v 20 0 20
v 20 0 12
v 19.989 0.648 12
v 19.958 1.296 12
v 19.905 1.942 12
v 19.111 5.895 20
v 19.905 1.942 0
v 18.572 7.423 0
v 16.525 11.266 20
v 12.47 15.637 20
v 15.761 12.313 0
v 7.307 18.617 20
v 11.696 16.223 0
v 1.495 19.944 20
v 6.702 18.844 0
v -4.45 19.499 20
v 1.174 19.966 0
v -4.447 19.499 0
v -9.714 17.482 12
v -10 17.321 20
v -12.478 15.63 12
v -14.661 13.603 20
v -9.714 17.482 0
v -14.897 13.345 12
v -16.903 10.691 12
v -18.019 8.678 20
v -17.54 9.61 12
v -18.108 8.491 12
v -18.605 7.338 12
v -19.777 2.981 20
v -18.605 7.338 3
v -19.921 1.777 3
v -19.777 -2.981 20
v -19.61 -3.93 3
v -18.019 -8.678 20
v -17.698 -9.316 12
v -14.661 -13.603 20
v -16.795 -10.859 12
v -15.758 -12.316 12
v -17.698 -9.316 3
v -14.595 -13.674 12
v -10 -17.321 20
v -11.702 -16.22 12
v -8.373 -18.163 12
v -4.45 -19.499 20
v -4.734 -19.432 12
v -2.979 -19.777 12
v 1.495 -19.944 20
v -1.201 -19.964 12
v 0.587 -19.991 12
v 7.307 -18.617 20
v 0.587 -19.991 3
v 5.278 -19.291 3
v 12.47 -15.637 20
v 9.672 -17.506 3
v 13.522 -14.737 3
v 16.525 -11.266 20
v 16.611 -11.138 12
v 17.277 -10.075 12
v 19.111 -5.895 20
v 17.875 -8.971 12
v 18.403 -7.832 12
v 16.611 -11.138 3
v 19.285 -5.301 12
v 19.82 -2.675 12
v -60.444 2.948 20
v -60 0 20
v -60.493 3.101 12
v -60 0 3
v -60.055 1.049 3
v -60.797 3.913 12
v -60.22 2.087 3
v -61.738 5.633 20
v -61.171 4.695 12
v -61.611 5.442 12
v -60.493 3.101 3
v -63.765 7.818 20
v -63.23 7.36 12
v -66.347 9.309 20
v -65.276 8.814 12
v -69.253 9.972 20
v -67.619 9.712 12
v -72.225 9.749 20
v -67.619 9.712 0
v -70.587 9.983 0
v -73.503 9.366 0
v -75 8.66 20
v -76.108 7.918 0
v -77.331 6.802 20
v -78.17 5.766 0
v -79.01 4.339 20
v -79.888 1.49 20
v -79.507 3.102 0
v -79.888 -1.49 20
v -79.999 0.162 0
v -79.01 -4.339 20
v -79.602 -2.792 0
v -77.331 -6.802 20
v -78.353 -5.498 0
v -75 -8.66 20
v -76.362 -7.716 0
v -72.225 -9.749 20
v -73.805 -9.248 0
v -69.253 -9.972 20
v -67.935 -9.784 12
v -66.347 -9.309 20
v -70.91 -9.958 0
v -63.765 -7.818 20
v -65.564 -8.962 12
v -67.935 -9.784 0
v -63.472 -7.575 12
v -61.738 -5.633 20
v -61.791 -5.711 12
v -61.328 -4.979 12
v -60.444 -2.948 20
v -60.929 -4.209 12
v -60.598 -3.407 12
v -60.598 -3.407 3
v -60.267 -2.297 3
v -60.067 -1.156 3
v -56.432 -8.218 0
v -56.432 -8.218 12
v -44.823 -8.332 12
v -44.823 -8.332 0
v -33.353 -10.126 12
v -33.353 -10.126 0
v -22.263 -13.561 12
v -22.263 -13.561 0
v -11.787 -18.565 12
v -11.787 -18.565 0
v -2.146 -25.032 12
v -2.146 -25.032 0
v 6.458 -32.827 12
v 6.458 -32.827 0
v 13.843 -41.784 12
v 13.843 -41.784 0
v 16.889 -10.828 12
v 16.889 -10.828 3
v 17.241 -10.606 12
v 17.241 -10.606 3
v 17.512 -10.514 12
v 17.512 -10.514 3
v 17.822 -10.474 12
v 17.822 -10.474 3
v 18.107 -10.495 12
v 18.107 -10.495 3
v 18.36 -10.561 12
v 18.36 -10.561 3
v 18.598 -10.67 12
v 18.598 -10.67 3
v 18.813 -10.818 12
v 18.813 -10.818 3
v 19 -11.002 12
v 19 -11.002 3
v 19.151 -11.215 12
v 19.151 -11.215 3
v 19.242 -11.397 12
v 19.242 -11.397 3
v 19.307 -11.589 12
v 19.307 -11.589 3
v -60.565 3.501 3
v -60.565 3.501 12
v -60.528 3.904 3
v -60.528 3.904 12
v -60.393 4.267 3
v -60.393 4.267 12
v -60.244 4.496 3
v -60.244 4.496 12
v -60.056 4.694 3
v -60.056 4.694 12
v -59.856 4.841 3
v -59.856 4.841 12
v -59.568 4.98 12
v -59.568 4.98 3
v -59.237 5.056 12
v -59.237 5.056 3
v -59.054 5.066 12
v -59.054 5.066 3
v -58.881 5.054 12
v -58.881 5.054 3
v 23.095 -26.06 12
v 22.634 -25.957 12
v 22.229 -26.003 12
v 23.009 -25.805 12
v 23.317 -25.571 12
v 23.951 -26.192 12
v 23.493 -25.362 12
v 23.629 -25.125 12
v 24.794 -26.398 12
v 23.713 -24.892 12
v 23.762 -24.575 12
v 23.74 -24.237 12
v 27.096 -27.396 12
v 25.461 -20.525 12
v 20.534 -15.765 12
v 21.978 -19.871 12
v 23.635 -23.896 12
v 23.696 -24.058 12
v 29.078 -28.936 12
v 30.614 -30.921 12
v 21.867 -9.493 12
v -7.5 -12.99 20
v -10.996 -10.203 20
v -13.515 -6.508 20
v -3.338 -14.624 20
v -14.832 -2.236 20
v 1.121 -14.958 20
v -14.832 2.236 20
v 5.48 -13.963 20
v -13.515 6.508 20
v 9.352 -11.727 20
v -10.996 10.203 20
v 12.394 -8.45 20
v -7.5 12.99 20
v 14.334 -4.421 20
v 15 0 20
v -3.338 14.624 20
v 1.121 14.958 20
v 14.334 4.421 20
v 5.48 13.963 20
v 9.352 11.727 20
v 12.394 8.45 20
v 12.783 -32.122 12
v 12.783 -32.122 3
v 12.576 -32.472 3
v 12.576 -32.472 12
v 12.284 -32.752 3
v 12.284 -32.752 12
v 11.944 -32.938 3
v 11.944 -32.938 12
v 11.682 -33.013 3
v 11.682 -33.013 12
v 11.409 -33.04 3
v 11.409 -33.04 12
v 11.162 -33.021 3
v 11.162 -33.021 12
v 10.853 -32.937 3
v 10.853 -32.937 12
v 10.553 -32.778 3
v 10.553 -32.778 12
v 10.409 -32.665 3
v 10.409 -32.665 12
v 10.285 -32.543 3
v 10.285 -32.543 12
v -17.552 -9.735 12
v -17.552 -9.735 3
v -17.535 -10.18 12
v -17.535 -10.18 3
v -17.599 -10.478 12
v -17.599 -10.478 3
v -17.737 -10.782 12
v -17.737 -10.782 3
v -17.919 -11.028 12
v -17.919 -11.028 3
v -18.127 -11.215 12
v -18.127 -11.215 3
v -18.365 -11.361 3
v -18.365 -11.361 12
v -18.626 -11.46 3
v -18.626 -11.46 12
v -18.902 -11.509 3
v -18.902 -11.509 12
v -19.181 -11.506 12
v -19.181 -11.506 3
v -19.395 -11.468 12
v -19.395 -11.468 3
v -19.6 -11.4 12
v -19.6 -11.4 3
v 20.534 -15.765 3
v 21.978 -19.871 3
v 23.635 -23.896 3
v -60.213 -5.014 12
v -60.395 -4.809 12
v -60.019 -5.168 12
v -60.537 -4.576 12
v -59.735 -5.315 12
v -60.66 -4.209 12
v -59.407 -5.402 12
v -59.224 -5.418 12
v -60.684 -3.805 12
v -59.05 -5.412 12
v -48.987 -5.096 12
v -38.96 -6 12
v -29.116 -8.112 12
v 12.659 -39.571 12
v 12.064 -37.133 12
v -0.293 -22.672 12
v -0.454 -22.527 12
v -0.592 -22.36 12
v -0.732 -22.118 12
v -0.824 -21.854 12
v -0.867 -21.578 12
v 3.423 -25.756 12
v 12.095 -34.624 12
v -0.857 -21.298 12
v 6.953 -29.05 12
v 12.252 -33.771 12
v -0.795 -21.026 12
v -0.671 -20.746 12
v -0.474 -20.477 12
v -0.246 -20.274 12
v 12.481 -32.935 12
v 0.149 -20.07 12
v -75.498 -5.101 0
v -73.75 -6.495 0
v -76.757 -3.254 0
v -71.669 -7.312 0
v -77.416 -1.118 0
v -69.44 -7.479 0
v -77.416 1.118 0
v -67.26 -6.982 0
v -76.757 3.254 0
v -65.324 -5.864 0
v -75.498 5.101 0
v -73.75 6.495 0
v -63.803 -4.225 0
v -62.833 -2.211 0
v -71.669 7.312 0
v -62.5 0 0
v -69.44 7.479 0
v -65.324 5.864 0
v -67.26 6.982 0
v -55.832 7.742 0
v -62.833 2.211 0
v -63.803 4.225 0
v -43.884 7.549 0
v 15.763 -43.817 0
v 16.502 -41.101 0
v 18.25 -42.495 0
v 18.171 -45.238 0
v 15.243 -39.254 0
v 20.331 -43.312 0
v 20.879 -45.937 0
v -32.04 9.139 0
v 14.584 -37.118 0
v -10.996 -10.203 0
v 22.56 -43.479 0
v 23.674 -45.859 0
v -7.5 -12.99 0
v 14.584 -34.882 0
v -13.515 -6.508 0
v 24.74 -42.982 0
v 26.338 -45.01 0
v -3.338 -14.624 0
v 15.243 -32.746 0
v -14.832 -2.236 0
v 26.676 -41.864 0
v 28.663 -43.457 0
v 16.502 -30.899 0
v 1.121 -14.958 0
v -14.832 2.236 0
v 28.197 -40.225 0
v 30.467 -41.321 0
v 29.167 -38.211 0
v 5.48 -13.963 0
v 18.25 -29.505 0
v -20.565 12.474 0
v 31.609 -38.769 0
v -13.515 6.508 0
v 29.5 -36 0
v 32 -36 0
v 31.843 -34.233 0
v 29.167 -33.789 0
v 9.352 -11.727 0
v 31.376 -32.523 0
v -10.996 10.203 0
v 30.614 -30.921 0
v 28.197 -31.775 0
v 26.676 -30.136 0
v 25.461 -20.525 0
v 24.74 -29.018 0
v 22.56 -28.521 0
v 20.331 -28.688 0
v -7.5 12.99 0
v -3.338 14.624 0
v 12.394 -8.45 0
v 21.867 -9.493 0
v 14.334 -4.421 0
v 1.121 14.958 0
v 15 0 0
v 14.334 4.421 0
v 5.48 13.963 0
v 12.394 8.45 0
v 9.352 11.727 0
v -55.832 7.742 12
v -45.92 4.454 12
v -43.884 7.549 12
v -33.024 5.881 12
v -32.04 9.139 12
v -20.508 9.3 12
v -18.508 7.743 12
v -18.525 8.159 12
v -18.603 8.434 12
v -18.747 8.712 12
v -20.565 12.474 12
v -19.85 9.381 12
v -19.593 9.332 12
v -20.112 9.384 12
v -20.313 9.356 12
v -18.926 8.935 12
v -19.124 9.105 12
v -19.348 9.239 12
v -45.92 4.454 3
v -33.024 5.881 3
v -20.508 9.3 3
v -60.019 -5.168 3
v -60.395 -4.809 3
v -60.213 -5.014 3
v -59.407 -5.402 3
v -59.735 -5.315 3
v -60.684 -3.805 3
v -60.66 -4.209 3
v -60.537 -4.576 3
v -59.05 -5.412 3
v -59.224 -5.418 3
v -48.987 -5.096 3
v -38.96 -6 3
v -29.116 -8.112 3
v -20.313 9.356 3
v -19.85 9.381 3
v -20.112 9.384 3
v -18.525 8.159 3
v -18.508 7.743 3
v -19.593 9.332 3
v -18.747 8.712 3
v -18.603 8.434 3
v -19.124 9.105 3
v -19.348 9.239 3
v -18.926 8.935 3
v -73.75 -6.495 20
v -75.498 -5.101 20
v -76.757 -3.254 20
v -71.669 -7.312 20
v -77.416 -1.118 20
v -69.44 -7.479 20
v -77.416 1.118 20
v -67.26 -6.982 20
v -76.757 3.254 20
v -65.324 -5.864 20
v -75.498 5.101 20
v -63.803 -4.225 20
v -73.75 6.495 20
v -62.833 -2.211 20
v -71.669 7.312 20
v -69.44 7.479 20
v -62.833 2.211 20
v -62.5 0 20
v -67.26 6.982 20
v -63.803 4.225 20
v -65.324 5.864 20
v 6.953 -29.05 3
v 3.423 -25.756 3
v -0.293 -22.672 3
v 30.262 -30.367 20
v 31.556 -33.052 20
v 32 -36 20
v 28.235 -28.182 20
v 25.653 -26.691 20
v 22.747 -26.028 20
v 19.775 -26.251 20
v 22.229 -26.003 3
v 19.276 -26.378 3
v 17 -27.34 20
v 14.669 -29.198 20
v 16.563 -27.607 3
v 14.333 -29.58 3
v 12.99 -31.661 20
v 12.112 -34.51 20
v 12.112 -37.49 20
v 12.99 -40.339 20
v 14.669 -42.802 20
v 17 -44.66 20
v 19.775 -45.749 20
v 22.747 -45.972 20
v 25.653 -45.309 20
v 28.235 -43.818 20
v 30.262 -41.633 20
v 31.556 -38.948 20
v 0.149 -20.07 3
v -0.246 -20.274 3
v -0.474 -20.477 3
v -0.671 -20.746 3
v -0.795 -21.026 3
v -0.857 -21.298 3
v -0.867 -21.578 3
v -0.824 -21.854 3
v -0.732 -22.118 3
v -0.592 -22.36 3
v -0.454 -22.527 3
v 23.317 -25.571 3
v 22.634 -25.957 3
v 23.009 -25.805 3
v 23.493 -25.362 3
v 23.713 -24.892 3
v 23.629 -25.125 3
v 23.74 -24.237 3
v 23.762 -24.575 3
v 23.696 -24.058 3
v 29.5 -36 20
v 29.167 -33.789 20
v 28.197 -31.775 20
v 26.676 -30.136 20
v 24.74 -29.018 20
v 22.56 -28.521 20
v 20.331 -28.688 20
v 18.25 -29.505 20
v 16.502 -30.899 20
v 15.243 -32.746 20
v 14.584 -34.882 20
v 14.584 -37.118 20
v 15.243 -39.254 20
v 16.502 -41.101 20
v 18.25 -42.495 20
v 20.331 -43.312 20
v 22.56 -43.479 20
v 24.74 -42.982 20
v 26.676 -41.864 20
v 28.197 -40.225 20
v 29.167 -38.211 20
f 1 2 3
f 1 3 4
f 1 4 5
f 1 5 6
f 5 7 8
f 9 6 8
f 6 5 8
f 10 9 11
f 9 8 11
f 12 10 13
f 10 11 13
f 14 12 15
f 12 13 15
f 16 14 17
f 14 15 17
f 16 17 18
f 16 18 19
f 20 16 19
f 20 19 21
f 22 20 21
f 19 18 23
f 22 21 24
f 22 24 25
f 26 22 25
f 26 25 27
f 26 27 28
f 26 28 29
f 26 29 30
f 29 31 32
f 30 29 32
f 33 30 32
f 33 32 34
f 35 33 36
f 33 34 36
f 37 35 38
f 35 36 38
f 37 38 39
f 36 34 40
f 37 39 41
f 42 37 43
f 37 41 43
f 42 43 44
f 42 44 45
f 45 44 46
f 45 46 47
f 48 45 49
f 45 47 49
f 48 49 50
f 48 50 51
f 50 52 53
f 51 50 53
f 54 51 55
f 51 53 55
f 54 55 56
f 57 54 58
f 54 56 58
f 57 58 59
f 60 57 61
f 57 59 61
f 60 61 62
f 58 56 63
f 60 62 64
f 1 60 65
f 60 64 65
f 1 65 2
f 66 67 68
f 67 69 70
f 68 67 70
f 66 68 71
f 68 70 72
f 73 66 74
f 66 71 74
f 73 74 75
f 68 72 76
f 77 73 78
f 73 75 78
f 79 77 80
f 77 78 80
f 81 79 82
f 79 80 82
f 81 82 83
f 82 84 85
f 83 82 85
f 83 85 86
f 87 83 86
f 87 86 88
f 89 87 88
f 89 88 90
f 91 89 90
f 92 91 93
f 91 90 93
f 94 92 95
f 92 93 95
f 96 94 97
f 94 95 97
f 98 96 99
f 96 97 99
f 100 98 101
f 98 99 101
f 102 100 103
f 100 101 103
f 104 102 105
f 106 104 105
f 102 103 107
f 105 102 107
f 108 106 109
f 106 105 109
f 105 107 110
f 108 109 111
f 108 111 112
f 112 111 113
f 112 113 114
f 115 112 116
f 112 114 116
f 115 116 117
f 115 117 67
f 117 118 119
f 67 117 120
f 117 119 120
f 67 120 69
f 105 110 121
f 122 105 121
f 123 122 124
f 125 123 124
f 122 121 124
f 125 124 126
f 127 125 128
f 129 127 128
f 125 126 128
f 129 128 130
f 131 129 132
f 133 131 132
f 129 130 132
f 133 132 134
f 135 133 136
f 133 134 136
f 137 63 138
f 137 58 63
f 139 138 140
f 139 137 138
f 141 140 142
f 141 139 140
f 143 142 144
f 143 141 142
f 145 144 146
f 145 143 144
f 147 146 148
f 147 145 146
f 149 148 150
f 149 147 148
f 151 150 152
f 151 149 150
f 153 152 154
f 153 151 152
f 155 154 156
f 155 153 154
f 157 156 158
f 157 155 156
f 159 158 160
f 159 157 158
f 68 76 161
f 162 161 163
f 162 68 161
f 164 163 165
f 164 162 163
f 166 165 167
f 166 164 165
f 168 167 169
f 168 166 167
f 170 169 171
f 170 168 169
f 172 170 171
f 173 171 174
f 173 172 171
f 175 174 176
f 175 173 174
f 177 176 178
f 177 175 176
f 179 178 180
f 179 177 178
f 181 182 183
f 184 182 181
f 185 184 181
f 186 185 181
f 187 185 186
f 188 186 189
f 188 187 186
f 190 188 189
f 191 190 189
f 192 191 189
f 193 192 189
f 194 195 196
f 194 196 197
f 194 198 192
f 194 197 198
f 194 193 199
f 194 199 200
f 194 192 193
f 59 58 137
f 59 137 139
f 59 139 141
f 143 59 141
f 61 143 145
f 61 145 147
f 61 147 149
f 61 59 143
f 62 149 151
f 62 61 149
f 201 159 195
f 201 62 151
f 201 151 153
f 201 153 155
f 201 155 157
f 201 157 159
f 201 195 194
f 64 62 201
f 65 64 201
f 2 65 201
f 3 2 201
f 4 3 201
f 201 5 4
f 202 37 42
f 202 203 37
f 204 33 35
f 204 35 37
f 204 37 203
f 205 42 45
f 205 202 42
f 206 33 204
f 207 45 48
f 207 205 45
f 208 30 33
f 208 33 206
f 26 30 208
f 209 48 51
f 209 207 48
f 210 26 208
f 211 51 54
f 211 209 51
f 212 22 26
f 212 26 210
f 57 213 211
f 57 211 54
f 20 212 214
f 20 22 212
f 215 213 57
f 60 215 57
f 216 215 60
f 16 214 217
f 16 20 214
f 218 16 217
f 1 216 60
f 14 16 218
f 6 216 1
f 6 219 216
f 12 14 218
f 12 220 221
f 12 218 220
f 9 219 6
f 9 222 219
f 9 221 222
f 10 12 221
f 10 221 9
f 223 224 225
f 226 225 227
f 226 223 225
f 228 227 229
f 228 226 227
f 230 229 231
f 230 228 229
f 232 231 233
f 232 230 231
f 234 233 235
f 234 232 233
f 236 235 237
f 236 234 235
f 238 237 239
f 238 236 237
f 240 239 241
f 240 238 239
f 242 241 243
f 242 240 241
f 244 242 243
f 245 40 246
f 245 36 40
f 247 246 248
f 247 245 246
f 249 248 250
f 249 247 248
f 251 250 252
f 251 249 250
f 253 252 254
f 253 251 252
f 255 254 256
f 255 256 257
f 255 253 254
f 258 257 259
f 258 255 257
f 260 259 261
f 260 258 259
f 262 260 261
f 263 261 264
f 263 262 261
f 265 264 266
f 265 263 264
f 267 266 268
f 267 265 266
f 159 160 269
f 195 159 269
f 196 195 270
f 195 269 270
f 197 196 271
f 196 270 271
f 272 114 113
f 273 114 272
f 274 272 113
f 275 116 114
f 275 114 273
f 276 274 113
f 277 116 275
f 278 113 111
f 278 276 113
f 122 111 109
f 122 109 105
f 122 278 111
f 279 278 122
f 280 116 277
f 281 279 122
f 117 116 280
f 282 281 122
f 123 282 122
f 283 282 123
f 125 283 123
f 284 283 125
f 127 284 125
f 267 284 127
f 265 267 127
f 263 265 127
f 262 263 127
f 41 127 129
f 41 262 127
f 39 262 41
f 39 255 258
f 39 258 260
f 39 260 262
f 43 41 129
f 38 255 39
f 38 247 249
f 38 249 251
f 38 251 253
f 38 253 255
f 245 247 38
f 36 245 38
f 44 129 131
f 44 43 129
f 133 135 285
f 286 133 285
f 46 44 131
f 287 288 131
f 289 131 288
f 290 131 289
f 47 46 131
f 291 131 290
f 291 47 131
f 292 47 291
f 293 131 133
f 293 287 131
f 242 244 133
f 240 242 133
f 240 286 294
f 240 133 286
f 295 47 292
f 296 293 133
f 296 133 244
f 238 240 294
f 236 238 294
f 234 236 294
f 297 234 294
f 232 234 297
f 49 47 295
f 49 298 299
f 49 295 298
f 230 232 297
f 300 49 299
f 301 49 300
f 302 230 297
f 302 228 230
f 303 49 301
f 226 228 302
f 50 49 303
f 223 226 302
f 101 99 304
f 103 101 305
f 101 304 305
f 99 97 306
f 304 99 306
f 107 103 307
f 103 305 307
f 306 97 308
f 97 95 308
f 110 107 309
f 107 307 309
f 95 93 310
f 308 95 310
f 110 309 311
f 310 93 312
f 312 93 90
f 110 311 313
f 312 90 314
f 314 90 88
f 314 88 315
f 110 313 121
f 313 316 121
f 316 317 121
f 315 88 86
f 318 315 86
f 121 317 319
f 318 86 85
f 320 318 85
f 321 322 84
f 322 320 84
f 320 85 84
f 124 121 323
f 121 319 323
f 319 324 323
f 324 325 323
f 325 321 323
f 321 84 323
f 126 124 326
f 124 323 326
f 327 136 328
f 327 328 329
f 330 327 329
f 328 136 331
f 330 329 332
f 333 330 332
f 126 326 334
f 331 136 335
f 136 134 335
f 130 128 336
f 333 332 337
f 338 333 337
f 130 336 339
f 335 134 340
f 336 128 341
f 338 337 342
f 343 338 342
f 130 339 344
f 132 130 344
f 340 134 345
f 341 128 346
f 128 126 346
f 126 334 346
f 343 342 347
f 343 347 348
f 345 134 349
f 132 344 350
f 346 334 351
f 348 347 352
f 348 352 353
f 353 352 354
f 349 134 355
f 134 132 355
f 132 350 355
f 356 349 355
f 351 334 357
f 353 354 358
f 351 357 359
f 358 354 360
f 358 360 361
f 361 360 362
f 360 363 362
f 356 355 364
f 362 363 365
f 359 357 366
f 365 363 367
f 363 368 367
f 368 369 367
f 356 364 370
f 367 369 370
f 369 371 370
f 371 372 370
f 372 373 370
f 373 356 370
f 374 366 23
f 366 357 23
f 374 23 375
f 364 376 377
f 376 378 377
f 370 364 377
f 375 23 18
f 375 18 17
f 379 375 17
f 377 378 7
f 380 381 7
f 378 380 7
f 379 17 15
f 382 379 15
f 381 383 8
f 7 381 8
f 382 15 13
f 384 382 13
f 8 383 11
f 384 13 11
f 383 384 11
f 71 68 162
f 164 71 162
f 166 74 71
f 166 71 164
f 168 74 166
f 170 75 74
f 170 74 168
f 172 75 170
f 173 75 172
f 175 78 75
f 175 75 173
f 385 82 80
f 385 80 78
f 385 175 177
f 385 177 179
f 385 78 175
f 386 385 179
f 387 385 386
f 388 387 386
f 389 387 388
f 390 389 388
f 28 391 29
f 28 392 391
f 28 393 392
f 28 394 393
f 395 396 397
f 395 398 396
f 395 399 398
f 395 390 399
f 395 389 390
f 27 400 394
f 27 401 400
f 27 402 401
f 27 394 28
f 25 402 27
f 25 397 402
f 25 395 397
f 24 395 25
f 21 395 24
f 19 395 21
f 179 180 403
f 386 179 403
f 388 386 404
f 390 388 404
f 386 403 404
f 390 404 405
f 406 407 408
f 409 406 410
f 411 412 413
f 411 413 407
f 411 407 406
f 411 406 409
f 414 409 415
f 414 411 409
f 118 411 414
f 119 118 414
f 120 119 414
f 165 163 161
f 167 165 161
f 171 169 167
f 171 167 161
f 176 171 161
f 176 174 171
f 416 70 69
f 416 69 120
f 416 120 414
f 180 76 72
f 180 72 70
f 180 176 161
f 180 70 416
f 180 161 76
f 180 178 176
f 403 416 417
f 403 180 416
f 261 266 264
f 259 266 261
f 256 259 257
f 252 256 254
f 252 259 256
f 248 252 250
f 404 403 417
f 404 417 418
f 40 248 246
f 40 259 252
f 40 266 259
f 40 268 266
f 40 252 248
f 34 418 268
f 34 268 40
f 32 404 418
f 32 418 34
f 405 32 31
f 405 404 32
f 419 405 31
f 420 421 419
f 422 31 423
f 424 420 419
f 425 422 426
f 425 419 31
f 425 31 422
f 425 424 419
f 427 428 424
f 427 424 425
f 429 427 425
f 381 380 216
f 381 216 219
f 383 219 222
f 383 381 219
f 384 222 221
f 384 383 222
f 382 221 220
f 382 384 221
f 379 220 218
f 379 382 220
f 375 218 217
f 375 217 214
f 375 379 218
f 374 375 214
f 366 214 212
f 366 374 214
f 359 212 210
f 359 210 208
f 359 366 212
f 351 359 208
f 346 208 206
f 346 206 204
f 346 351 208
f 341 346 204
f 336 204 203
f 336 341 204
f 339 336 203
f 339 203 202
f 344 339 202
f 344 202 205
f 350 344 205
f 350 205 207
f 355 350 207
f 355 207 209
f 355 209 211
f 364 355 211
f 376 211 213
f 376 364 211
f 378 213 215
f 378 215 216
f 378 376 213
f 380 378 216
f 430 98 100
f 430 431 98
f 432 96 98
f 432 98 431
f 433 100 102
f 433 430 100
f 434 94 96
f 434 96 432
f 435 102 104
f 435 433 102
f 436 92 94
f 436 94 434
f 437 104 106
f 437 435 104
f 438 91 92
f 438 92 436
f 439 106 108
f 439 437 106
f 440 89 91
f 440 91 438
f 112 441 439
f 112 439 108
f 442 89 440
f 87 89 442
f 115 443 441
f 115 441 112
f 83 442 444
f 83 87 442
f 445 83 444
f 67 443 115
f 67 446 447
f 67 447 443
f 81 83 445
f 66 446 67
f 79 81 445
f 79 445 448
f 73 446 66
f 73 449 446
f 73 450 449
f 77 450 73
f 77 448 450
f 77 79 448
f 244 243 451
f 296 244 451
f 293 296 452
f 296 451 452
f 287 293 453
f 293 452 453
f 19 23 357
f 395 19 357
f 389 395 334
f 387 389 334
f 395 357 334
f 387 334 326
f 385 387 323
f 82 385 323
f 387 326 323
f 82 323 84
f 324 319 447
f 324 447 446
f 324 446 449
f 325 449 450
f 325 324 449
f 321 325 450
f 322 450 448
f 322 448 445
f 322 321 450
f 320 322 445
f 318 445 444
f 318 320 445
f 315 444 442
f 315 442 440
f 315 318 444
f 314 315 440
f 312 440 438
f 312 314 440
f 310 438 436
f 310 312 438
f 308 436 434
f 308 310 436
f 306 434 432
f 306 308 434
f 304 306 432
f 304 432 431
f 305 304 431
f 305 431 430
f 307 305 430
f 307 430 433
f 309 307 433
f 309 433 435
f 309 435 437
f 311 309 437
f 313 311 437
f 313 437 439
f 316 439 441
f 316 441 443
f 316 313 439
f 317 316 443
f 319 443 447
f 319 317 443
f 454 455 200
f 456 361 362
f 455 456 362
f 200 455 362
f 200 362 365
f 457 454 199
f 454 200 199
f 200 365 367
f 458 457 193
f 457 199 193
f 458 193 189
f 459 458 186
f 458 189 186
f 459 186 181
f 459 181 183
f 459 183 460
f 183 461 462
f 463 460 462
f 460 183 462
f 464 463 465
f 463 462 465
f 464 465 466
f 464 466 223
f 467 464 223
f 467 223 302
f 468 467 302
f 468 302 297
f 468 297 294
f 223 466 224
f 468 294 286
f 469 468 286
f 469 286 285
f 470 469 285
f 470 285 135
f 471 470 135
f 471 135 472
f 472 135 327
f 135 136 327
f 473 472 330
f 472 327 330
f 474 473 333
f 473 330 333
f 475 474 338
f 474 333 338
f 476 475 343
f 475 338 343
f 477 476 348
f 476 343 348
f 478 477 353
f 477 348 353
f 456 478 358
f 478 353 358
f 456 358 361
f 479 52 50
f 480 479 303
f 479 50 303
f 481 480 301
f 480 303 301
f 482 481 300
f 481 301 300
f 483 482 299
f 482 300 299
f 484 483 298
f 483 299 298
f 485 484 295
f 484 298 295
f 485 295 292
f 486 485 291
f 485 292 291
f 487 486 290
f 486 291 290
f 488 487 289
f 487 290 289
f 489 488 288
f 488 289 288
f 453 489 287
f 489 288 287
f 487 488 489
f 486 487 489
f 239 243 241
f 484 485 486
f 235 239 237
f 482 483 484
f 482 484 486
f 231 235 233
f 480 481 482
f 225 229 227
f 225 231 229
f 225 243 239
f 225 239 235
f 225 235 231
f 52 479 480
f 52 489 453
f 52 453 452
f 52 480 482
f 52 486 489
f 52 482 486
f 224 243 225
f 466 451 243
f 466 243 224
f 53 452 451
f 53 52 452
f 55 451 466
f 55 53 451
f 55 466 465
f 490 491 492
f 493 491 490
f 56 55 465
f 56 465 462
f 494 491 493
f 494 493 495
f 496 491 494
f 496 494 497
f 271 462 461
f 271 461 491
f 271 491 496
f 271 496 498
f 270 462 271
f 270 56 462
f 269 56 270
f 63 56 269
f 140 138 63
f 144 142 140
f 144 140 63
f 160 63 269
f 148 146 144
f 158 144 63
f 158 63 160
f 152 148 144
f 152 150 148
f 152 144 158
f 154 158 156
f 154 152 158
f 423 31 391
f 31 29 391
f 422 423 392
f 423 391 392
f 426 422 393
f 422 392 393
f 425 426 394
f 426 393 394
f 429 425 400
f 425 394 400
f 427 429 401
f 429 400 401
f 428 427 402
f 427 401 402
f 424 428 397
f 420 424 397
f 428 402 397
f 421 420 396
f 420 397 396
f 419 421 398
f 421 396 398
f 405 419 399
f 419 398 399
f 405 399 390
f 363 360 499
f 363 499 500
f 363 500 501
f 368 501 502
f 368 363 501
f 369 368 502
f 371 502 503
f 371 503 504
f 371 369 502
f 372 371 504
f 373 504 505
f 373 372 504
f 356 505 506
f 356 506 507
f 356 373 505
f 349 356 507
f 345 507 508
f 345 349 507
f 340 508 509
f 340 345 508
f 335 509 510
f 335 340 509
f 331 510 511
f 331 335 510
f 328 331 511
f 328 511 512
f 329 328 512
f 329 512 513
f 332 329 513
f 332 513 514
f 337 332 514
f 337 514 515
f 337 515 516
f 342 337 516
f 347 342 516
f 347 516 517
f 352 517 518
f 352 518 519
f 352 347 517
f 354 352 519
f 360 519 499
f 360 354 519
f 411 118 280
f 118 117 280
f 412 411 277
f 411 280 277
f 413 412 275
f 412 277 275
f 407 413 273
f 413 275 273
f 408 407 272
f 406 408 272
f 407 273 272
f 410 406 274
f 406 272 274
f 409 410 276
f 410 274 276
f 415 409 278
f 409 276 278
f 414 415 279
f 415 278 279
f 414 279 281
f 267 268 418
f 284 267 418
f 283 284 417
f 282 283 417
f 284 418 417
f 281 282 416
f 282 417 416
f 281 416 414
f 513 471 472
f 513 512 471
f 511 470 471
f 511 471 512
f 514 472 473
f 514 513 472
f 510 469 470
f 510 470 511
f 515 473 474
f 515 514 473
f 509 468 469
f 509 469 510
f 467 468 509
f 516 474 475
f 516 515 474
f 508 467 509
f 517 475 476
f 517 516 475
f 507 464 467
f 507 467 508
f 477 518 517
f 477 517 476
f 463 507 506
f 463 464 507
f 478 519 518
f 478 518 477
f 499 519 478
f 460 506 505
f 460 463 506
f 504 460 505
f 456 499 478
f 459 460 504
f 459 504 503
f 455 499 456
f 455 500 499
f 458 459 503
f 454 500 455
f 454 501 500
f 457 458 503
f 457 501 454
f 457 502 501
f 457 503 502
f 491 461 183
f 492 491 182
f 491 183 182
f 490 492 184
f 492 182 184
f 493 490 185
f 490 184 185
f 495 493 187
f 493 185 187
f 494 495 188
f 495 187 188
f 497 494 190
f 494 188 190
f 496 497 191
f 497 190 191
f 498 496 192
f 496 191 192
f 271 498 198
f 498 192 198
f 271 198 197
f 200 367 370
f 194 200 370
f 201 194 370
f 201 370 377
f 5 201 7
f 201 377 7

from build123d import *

# Parameters (mm, degrees)
SKETCH1_R           = 20
BOSS_EXTRUDE4_DEPTH = 20
SKETCH1_10_R        = 10
SKETCH1_10_R_2      = 7.5
SKETCH1_10_R_3      = 15
BOSS_EXTRUDE5_DEPTH = 20
SKETCH1_11_R        = 15
CUT_EXTRUDE1_DEPTH  = 20
BOSS_EXTRUDE6_DEPTH = 12
BOSS_EXTRUDE7_DEPTH = 3
FILLET1_R           = 1.5


with BuildPart() as part:
    # Sketch1 → Boss-Extrude4 (new body)
    with BuildSketch(Plane.XY):
        Circle(SKETCH1_R)
    extrude(amount=BOSS_EXTRUDE4_DEPTH)

    # Sketch1<10> → Boss-Extrude5 (add)
    # profile 1 of 3: a face of its own
    with BuildSketch(Plane.XY):
        with Locations((-70, 0)):
            Circle(SKETCH1_10_R)
        with Locations((-70, 0)):
            Circle(SKETCH1_10_R_2, mode=Mode.SUBTRACT)
    # profile 2 of 3: a face of its own
    with BuildSketch(Plane.XY):
        with Locations((22, -36)):
            Circle(SKETCH1_10_R)
        with Locations((22, -36)):
            Circle(SKETCH1_10_R_2, mode=Mode.SUBTRACT)
    # profile 3 of 3: a face of its own
    with BuildSketch(Plane.XY):
        Circle(SKETCH1_10_R_3)
    extrude(amount=BOSS_EXTRUDE5_DEPTH)


with BuildPart() as boss_extrude5_piece_1:
    # of the separate pieces the step leaves, piece 1, a body of its own (boss_extrude5_pieces)
    add(part.part.solids().sort_by_distance((20, 0, 0))[0])

    # Sketch1<11> → Cut-Extrude1 (cut)
    with BuildSketch(Plane.XY):
        Circle(SKETCH1_11_R)
    extrude(amount=CUT_EXTRUDE1_DEPTH, mode=Mode.SUBTRACT)



with BuildPart() as boss_extrude5_piece_2:
    # of the separate pieces the step leaves, piece 2, a body of its own (boss_extrude5_pieces)
    add(part.part.solids().sort_by_distance((32, -36, 0))[0])


with BuildPart() as boss_extrude5_piece_3:
    # of the separate pieces the step leaves, piece 3, a body of its own (boss_extrude5_pieces)
    add(part.part.solids().sort_by_distance((-60, 0, 0))[0])


with BuildPart() as boss_extrude5_piece_1_1:
    add(boss_extrude5_piece_1.part)

    add(boss_extrude5_piece_2.part)  # Boss-Extrude6 merges Boss-Extrude5 piece 2

    add(boss_extrude5_piece_3.part)  # Boss-Extrude6 merges Boss-Extrude5 piece 3
    # Sketch1<12> → Boss-Extrude6 (add)
    with BuildSketch(Plane.XY):
        with BuildLine():
            ThreePointArc((-67.619047619, 9.712418121), (-64.207085766, 8.151205106), (-61.610700763, 5.442394539))
            ThreePointArc((-61.610700763, 5.442394539), (-38.89416694, 4.977846482), (-16.902840155, 10.690836951))
            ThreePointArc((-16.902840155, 10.690836951), (-13.734956085, 14.537915303), (-9.714285714, 17.482352618))
            ThreePointArc((-9.714285714, 17.482352618), (-37.932007586, 8.122402385), (-67.619047619, 9.712418121))
        make_face()
        with BuildLine():
            ThreePointArc((-14.595467543, -13.673782476), (-37.607048321, -6.216745586), (-61.791440547, -5.711352878))
            ThreePointArc((-61.791440547, -5.711352878), (-64.474228629, -8.334617613), (-67.934982867, -9.784462389))
            ThreePointArc((-67.934982867, -9.784462389), (-22.262897918, -13.560739124), (13.842794911, -41.784462389))
            ThreePointArc((13.842794911, -41.784462389), (12.285119236, -38.370884169), (12.095188973, -34.623512255))
            ThreePointArc((12.095188973, -34.623512255), (4.201963756, -26.450336843), (-4.733552286, -19.431764787))
            ThreePointArc((-4.733552286, -19.431764787), (-10.084212511, -17.271614228), (-14.595467543, -13.673782476))
        make_face()
        with BuildLine():
            ThreePointArc((30.614150003, -30.920982406), (23.463789692, -15.074619609), (19.905470006, 1.94223167))
            ThreePointArc((19.905470006, 1.94223167), (19.767704174, -3.039386732), (18.402586233, -7.832293401))
            ThreePointArc((18.402586233, -7.832293401), (21.047204692, -17.304888513), (24.793712928, -26.398168504))
            ThreePointArc((24.793712928, -26.398168504), (28.135861436, -28.103722115), (30.614150003, -30.920982406))
        make_face()
    extrude(amount=BOSS_EXTRUDE6_DEPTH)

    # Sketch1<13> → Boss-Extrude7 (add)
    with BuildSketch(Plane.XY):
        with BuildLine():
            ThreePointArc((-61.610700763, 5.442394539), (-60.001312654, -0.162022728), (-61.791440547, -5.711352878))
            ThreePointArc((-61.791440547, -5.711352878), (-37.607048321, -6.216745586), (-14.595467543, -13.673782476))
            ThreePointArc((-14.595467543, -13.673782476), (-19.910914517, -1.885598869), (-16.902840155, 10.690836951))
            ThreePointArc((-16.902840155, 10.690836951), (-38.89416694, 4.977846482), (-61.610700763, 5.442394539))
        make_face()
        with BuildLine():
            ThreePointArc((18.402586233, -7.832293401), (8.963679846, -17.878826685), (-4.733552286, -19.431764787))
            ThreePointArc((-4.733552286, -19.431764787), (4.201963756, -26.450336843), (12.095188973, -34.623512255))
            ThreePointArc((12.095188973, -34.623512255), (16.563457073, -27.606907543), (24.793712928, -26.398168504))
            ThreePointArc((24.793712928, -26.398168504), (21.047204692, -17.304888513), (18.402586233, -7.832293401))
        make_face()
    extrude(amount=BOSS_EXTRUDE7_DEPTH)

    # Fillet1
    fillet1_edges = [boss_extrude5_piece_1_1.edges().sort_by_distance(p)[0] for p in [
        (12.095188973, -34.623512255, 7.5),
        (24.793712928, -26.398168504, 7.5),
        (-4.733552286, -19.431764787, 7.5),
        (18.402586233, -7.832293401, 7.5),
        (-14.595467543, -13.673782476, 7.5),
        (-16.902840155, 10.690836951, 7.5),
        (-61.791440547, -5.711352878, 7.5),
        (-61.610700763, 5.442394539, 7.5),
    ]]
    fillet(fillet1_edges, radius=FILLET1_R)


solid = boss_extrude5_piece_1_1.part
